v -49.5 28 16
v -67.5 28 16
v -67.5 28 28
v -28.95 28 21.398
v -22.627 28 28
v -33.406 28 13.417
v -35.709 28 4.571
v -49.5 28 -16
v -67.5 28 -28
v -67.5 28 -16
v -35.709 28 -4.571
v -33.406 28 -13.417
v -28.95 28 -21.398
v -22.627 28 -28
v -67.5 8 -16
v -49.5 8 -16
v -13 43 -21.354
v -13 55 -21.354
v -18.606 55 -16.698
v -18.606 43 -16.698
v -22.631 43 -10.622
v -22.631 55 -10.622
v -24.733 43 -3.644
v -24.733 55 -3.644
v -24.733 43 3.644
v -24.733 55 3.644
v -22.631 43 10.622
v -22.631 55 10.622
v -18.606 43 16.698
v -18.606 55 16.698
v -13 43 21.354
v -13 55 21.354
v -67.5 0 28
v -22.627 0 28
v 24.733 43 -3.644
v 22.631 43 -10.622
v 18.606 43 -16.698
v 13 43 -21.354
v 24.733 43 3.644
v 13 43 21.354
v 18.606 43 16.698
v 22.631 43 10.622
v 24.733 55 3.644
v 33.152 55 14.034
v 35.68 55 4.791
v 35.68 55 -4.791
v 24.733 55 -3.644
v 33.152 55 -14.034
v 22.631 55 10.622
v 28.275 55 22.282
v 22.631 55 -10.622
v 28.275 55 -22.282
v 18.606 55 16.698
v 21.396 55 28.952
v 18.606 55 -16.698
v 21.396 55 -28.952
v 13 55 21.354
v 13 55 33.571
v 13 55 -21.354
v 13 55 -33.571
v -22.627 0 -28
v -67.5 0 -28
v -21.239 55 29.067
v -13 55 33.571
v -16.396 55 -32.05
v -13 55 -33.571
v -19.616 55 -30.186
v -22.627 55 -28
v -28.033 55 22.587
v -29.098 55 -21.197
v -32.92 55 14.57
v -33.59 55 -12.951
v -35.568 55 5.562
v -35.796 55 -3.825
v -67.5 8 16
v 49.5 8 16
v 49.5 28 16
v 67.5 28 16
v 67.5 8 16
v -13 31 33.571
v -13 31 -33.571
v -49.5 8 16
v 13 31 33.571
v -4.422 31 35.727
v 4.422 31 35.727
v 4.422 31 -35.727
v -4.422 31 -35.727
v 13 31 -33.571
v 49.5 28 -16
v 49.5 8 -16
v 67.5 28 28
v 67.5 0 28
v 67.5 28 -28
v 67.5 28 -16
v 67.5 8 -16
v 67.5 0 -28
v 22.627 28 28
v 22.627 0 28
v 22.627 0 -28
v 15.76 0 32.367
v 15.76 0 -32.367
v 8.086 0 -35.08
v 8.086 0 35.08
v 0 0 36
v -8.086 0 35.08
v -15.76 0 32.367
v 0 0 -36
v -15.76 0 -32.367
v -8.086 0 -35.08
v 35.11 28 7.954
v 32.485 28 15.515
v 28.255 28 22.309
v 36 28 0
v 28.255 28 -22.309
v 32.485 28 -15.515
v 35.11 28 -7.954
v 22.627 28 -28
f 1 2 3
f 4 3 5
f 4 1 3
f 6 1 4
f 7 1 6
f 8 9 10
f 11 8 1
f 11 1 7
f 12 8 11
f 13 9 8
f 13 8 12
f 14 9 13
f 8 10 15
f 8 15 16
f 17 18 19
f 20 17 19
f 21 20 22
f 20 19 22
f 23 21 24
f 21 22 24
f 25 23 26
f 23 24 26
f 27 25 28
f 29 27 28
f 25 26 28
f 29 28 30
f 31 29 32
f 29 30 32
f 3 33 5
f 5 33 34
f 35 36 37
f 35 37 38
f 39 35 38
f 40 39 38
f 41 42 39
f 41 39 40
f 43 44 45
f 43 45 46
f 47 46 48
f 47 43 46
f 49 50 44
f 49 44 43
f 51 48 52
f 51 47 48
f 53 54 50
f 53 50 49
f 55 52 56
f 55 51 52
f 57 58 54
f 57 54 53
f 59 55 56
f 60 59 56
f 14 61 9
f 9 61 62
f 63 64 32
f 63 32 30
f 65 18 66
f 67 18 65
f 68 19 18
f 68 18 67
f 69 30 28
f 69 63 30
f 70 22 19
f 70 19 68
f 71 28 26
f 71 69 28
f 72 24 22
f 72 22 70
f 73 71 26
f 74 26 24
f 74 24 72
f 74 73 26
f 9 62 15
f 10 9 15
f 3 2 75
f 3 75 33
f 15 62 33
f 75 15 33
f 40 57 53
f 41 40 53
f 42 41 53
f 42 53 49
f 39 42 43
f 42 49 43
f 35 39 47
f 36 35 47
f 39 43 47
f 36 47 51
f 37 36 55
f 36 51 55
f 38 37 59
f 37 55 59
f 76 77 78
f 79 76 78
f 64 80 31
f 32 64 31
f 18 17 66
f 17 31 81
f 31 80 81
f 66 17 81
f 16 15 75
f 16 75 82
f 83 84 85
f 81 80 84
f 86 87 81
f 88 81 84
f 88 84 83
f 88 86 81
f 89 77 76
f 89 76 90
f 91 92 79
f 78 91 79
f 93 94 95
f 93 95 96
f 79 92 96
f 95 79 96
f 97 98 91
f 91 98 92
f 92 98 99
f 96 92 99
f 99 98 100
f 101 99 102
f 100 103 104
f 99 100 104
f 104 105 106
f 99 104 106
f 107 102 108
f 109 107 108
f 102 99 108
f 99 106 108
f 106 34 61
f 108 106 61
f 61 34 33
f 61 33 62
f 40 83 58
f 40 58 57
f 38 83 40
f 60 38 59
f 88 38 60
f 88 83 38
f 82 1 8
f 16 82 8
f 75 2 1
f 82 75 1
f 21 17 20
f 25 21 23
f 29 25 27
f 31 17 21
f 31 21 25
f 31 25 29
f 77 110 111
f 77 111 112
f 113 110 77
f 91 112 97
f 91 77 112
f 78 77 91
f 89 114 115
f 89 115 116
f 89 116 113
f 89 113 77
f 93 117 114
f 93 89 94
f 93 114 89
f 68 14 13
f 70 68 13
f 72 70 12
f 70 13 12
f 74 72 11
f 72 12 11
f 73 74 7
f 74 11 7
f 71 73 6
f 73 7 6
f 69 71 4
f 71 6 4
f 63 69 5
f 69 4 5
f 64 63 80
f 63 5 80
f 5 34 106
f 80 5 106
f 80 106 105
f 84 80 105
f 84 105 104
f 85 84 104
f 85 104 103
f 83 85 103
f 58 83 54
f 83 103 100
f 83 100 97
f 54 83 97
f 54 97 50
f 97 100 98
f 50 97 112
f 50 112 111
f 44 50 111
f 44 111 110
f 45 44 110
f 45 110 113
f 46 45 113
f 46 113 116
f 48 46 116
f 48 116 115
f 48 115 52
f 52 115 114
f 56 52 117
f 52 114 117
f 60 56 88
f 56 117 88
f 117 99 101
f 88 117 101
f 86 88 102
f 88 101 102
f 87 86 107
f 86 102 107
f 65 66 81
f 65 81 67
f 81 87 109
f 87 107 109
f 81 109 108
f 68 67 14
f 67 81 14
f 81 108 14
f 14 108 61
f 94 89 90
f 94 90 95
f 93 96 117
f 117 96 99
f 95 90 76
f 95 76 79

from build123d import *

# Parameters (mm, degrees)
BOSS_EXTRUDE1_DEPTH   = 28
BOSS_EXTRUDE1_2_DEPTH = 28
SKETCH1_3_R           = 36
BOSS_EXTRUDE2_DEPTH   = 55
CUT_EXTRUDE1_START    = 55
SKETCH1_4_R           = 25
CUT_EXTRUDE1_DEPTH    = 12
CUT_EXTRUDE2_START    = 31
SKETCH1_5_W           = 26
SKETCH1_5_H           = 85.646984924
CUT_EXTRUDE2_DEPTH    = 64.21915941
SKETCH2_W             = 18
SKETCH2_H             = 32
CUT_EXTRUDE3_DEPTH    = 20


with BuildPart() as part:
    # Sketch1 → Boss-Extrude1 (new body)
    with BuildSketch(Plane(origin=(0, 0, 0), x_dir=(1, 0, 0), z_dir=(0, 1, 0))):
        with BuildLine():
            Line((-67.5, 28), (-67.5, -28))
            Line((-67.5, -28), (-22.627416998, -28))
            ThreePointArc((-22.627416998, -28), (-36, 0), (-22.627416998, 28))
            Line((-22.627416998, 28), (-67.5, 28))
        make_face()
    extrude(amount=BOSS_EXTRUDE1_DEPTH)



with BuildPart() as body_2:
    # Sketch1 → Boss-Extrude1 2 (new body)
    with BuildSketch(Plane(origin=(0, 0, 0), x_dir=(1, 0, 0), z_dir=(0, 1, 0))):
        with BuildLine():
            ThreePointArc((22.627416998, 28), (36, 0), (22.627416998, -28))
            Line((22.627416998, -28), (67.5, -28))
            Line((67.5, -28), (67.5, 28))
            Line((67.5, 28), (22.627416998, 28))
        make_face()
    extrude(amount=BOSS_EXTRUDE1_2_DEPTH)


with BuildPart() as part_1:
    add(part.part)

    add(body_2.part)  # Boss-Extrude2 merges body 2
    # Sketch1<3> → Boss-Extrude2 (add)
    with BuildSketch(Plane(origin=(0, 0, 0), x_dir=(1, 0, 0), z_dir=(0, 1, 0))):
        Circle(SKETCH1_3_R)
    extrude(amount=BOSS_EXTRUDE2_DEPTH)

    # Sketch1<4> → Cut-Extrude1 (cut)
    with BuildSketch(Plane(origin=(0, 0, 0), x_dir=(1, 0, 0), z_dir=(0, 1, 0)).offset(CUT_EXTRUDE1_START)):
        Circle(SKETCH1_4_R)
    extrude(amount=-CUT_EXTRUDE1_DEPTH, mode=Mode.SUBTRACT)

    # Sketch1<5> → Cut-Extrude2 (cut, through all)
    with BuildSketch(Plane(origin=(0, 0, 0), x_dir=(1, 0, 0), z_dir=(0, 1, 0)).offset(CUT_EXTRUDE2_START)):
        Rectangle(SKETCH1_5_W, SKETCH1_5_H)
    extrude(amount=CUT_EXTRUDE2_DEPTH, mode=Mode.SUBTRACT)

    # Sketch2 → Cut-Extrude3 (cut)
    with BuildSketch(Plane(origin=(0, 28, 0), x_dir=(1, 0, 0), z_dir=(0, 1, 0))):
        with Locations((-58.5, 0)):
            Rectangle(SKETCH2_W, SKETCH2_H)
        with Locations((58.5, 0)):
            Rectangle(SKETCH2_W, SKETCH2_H)
    extrude(amount=-CUT_EXTRUDE3_DEPTH, mode=Mode.SUBTRACT)


solid = part_1.part
